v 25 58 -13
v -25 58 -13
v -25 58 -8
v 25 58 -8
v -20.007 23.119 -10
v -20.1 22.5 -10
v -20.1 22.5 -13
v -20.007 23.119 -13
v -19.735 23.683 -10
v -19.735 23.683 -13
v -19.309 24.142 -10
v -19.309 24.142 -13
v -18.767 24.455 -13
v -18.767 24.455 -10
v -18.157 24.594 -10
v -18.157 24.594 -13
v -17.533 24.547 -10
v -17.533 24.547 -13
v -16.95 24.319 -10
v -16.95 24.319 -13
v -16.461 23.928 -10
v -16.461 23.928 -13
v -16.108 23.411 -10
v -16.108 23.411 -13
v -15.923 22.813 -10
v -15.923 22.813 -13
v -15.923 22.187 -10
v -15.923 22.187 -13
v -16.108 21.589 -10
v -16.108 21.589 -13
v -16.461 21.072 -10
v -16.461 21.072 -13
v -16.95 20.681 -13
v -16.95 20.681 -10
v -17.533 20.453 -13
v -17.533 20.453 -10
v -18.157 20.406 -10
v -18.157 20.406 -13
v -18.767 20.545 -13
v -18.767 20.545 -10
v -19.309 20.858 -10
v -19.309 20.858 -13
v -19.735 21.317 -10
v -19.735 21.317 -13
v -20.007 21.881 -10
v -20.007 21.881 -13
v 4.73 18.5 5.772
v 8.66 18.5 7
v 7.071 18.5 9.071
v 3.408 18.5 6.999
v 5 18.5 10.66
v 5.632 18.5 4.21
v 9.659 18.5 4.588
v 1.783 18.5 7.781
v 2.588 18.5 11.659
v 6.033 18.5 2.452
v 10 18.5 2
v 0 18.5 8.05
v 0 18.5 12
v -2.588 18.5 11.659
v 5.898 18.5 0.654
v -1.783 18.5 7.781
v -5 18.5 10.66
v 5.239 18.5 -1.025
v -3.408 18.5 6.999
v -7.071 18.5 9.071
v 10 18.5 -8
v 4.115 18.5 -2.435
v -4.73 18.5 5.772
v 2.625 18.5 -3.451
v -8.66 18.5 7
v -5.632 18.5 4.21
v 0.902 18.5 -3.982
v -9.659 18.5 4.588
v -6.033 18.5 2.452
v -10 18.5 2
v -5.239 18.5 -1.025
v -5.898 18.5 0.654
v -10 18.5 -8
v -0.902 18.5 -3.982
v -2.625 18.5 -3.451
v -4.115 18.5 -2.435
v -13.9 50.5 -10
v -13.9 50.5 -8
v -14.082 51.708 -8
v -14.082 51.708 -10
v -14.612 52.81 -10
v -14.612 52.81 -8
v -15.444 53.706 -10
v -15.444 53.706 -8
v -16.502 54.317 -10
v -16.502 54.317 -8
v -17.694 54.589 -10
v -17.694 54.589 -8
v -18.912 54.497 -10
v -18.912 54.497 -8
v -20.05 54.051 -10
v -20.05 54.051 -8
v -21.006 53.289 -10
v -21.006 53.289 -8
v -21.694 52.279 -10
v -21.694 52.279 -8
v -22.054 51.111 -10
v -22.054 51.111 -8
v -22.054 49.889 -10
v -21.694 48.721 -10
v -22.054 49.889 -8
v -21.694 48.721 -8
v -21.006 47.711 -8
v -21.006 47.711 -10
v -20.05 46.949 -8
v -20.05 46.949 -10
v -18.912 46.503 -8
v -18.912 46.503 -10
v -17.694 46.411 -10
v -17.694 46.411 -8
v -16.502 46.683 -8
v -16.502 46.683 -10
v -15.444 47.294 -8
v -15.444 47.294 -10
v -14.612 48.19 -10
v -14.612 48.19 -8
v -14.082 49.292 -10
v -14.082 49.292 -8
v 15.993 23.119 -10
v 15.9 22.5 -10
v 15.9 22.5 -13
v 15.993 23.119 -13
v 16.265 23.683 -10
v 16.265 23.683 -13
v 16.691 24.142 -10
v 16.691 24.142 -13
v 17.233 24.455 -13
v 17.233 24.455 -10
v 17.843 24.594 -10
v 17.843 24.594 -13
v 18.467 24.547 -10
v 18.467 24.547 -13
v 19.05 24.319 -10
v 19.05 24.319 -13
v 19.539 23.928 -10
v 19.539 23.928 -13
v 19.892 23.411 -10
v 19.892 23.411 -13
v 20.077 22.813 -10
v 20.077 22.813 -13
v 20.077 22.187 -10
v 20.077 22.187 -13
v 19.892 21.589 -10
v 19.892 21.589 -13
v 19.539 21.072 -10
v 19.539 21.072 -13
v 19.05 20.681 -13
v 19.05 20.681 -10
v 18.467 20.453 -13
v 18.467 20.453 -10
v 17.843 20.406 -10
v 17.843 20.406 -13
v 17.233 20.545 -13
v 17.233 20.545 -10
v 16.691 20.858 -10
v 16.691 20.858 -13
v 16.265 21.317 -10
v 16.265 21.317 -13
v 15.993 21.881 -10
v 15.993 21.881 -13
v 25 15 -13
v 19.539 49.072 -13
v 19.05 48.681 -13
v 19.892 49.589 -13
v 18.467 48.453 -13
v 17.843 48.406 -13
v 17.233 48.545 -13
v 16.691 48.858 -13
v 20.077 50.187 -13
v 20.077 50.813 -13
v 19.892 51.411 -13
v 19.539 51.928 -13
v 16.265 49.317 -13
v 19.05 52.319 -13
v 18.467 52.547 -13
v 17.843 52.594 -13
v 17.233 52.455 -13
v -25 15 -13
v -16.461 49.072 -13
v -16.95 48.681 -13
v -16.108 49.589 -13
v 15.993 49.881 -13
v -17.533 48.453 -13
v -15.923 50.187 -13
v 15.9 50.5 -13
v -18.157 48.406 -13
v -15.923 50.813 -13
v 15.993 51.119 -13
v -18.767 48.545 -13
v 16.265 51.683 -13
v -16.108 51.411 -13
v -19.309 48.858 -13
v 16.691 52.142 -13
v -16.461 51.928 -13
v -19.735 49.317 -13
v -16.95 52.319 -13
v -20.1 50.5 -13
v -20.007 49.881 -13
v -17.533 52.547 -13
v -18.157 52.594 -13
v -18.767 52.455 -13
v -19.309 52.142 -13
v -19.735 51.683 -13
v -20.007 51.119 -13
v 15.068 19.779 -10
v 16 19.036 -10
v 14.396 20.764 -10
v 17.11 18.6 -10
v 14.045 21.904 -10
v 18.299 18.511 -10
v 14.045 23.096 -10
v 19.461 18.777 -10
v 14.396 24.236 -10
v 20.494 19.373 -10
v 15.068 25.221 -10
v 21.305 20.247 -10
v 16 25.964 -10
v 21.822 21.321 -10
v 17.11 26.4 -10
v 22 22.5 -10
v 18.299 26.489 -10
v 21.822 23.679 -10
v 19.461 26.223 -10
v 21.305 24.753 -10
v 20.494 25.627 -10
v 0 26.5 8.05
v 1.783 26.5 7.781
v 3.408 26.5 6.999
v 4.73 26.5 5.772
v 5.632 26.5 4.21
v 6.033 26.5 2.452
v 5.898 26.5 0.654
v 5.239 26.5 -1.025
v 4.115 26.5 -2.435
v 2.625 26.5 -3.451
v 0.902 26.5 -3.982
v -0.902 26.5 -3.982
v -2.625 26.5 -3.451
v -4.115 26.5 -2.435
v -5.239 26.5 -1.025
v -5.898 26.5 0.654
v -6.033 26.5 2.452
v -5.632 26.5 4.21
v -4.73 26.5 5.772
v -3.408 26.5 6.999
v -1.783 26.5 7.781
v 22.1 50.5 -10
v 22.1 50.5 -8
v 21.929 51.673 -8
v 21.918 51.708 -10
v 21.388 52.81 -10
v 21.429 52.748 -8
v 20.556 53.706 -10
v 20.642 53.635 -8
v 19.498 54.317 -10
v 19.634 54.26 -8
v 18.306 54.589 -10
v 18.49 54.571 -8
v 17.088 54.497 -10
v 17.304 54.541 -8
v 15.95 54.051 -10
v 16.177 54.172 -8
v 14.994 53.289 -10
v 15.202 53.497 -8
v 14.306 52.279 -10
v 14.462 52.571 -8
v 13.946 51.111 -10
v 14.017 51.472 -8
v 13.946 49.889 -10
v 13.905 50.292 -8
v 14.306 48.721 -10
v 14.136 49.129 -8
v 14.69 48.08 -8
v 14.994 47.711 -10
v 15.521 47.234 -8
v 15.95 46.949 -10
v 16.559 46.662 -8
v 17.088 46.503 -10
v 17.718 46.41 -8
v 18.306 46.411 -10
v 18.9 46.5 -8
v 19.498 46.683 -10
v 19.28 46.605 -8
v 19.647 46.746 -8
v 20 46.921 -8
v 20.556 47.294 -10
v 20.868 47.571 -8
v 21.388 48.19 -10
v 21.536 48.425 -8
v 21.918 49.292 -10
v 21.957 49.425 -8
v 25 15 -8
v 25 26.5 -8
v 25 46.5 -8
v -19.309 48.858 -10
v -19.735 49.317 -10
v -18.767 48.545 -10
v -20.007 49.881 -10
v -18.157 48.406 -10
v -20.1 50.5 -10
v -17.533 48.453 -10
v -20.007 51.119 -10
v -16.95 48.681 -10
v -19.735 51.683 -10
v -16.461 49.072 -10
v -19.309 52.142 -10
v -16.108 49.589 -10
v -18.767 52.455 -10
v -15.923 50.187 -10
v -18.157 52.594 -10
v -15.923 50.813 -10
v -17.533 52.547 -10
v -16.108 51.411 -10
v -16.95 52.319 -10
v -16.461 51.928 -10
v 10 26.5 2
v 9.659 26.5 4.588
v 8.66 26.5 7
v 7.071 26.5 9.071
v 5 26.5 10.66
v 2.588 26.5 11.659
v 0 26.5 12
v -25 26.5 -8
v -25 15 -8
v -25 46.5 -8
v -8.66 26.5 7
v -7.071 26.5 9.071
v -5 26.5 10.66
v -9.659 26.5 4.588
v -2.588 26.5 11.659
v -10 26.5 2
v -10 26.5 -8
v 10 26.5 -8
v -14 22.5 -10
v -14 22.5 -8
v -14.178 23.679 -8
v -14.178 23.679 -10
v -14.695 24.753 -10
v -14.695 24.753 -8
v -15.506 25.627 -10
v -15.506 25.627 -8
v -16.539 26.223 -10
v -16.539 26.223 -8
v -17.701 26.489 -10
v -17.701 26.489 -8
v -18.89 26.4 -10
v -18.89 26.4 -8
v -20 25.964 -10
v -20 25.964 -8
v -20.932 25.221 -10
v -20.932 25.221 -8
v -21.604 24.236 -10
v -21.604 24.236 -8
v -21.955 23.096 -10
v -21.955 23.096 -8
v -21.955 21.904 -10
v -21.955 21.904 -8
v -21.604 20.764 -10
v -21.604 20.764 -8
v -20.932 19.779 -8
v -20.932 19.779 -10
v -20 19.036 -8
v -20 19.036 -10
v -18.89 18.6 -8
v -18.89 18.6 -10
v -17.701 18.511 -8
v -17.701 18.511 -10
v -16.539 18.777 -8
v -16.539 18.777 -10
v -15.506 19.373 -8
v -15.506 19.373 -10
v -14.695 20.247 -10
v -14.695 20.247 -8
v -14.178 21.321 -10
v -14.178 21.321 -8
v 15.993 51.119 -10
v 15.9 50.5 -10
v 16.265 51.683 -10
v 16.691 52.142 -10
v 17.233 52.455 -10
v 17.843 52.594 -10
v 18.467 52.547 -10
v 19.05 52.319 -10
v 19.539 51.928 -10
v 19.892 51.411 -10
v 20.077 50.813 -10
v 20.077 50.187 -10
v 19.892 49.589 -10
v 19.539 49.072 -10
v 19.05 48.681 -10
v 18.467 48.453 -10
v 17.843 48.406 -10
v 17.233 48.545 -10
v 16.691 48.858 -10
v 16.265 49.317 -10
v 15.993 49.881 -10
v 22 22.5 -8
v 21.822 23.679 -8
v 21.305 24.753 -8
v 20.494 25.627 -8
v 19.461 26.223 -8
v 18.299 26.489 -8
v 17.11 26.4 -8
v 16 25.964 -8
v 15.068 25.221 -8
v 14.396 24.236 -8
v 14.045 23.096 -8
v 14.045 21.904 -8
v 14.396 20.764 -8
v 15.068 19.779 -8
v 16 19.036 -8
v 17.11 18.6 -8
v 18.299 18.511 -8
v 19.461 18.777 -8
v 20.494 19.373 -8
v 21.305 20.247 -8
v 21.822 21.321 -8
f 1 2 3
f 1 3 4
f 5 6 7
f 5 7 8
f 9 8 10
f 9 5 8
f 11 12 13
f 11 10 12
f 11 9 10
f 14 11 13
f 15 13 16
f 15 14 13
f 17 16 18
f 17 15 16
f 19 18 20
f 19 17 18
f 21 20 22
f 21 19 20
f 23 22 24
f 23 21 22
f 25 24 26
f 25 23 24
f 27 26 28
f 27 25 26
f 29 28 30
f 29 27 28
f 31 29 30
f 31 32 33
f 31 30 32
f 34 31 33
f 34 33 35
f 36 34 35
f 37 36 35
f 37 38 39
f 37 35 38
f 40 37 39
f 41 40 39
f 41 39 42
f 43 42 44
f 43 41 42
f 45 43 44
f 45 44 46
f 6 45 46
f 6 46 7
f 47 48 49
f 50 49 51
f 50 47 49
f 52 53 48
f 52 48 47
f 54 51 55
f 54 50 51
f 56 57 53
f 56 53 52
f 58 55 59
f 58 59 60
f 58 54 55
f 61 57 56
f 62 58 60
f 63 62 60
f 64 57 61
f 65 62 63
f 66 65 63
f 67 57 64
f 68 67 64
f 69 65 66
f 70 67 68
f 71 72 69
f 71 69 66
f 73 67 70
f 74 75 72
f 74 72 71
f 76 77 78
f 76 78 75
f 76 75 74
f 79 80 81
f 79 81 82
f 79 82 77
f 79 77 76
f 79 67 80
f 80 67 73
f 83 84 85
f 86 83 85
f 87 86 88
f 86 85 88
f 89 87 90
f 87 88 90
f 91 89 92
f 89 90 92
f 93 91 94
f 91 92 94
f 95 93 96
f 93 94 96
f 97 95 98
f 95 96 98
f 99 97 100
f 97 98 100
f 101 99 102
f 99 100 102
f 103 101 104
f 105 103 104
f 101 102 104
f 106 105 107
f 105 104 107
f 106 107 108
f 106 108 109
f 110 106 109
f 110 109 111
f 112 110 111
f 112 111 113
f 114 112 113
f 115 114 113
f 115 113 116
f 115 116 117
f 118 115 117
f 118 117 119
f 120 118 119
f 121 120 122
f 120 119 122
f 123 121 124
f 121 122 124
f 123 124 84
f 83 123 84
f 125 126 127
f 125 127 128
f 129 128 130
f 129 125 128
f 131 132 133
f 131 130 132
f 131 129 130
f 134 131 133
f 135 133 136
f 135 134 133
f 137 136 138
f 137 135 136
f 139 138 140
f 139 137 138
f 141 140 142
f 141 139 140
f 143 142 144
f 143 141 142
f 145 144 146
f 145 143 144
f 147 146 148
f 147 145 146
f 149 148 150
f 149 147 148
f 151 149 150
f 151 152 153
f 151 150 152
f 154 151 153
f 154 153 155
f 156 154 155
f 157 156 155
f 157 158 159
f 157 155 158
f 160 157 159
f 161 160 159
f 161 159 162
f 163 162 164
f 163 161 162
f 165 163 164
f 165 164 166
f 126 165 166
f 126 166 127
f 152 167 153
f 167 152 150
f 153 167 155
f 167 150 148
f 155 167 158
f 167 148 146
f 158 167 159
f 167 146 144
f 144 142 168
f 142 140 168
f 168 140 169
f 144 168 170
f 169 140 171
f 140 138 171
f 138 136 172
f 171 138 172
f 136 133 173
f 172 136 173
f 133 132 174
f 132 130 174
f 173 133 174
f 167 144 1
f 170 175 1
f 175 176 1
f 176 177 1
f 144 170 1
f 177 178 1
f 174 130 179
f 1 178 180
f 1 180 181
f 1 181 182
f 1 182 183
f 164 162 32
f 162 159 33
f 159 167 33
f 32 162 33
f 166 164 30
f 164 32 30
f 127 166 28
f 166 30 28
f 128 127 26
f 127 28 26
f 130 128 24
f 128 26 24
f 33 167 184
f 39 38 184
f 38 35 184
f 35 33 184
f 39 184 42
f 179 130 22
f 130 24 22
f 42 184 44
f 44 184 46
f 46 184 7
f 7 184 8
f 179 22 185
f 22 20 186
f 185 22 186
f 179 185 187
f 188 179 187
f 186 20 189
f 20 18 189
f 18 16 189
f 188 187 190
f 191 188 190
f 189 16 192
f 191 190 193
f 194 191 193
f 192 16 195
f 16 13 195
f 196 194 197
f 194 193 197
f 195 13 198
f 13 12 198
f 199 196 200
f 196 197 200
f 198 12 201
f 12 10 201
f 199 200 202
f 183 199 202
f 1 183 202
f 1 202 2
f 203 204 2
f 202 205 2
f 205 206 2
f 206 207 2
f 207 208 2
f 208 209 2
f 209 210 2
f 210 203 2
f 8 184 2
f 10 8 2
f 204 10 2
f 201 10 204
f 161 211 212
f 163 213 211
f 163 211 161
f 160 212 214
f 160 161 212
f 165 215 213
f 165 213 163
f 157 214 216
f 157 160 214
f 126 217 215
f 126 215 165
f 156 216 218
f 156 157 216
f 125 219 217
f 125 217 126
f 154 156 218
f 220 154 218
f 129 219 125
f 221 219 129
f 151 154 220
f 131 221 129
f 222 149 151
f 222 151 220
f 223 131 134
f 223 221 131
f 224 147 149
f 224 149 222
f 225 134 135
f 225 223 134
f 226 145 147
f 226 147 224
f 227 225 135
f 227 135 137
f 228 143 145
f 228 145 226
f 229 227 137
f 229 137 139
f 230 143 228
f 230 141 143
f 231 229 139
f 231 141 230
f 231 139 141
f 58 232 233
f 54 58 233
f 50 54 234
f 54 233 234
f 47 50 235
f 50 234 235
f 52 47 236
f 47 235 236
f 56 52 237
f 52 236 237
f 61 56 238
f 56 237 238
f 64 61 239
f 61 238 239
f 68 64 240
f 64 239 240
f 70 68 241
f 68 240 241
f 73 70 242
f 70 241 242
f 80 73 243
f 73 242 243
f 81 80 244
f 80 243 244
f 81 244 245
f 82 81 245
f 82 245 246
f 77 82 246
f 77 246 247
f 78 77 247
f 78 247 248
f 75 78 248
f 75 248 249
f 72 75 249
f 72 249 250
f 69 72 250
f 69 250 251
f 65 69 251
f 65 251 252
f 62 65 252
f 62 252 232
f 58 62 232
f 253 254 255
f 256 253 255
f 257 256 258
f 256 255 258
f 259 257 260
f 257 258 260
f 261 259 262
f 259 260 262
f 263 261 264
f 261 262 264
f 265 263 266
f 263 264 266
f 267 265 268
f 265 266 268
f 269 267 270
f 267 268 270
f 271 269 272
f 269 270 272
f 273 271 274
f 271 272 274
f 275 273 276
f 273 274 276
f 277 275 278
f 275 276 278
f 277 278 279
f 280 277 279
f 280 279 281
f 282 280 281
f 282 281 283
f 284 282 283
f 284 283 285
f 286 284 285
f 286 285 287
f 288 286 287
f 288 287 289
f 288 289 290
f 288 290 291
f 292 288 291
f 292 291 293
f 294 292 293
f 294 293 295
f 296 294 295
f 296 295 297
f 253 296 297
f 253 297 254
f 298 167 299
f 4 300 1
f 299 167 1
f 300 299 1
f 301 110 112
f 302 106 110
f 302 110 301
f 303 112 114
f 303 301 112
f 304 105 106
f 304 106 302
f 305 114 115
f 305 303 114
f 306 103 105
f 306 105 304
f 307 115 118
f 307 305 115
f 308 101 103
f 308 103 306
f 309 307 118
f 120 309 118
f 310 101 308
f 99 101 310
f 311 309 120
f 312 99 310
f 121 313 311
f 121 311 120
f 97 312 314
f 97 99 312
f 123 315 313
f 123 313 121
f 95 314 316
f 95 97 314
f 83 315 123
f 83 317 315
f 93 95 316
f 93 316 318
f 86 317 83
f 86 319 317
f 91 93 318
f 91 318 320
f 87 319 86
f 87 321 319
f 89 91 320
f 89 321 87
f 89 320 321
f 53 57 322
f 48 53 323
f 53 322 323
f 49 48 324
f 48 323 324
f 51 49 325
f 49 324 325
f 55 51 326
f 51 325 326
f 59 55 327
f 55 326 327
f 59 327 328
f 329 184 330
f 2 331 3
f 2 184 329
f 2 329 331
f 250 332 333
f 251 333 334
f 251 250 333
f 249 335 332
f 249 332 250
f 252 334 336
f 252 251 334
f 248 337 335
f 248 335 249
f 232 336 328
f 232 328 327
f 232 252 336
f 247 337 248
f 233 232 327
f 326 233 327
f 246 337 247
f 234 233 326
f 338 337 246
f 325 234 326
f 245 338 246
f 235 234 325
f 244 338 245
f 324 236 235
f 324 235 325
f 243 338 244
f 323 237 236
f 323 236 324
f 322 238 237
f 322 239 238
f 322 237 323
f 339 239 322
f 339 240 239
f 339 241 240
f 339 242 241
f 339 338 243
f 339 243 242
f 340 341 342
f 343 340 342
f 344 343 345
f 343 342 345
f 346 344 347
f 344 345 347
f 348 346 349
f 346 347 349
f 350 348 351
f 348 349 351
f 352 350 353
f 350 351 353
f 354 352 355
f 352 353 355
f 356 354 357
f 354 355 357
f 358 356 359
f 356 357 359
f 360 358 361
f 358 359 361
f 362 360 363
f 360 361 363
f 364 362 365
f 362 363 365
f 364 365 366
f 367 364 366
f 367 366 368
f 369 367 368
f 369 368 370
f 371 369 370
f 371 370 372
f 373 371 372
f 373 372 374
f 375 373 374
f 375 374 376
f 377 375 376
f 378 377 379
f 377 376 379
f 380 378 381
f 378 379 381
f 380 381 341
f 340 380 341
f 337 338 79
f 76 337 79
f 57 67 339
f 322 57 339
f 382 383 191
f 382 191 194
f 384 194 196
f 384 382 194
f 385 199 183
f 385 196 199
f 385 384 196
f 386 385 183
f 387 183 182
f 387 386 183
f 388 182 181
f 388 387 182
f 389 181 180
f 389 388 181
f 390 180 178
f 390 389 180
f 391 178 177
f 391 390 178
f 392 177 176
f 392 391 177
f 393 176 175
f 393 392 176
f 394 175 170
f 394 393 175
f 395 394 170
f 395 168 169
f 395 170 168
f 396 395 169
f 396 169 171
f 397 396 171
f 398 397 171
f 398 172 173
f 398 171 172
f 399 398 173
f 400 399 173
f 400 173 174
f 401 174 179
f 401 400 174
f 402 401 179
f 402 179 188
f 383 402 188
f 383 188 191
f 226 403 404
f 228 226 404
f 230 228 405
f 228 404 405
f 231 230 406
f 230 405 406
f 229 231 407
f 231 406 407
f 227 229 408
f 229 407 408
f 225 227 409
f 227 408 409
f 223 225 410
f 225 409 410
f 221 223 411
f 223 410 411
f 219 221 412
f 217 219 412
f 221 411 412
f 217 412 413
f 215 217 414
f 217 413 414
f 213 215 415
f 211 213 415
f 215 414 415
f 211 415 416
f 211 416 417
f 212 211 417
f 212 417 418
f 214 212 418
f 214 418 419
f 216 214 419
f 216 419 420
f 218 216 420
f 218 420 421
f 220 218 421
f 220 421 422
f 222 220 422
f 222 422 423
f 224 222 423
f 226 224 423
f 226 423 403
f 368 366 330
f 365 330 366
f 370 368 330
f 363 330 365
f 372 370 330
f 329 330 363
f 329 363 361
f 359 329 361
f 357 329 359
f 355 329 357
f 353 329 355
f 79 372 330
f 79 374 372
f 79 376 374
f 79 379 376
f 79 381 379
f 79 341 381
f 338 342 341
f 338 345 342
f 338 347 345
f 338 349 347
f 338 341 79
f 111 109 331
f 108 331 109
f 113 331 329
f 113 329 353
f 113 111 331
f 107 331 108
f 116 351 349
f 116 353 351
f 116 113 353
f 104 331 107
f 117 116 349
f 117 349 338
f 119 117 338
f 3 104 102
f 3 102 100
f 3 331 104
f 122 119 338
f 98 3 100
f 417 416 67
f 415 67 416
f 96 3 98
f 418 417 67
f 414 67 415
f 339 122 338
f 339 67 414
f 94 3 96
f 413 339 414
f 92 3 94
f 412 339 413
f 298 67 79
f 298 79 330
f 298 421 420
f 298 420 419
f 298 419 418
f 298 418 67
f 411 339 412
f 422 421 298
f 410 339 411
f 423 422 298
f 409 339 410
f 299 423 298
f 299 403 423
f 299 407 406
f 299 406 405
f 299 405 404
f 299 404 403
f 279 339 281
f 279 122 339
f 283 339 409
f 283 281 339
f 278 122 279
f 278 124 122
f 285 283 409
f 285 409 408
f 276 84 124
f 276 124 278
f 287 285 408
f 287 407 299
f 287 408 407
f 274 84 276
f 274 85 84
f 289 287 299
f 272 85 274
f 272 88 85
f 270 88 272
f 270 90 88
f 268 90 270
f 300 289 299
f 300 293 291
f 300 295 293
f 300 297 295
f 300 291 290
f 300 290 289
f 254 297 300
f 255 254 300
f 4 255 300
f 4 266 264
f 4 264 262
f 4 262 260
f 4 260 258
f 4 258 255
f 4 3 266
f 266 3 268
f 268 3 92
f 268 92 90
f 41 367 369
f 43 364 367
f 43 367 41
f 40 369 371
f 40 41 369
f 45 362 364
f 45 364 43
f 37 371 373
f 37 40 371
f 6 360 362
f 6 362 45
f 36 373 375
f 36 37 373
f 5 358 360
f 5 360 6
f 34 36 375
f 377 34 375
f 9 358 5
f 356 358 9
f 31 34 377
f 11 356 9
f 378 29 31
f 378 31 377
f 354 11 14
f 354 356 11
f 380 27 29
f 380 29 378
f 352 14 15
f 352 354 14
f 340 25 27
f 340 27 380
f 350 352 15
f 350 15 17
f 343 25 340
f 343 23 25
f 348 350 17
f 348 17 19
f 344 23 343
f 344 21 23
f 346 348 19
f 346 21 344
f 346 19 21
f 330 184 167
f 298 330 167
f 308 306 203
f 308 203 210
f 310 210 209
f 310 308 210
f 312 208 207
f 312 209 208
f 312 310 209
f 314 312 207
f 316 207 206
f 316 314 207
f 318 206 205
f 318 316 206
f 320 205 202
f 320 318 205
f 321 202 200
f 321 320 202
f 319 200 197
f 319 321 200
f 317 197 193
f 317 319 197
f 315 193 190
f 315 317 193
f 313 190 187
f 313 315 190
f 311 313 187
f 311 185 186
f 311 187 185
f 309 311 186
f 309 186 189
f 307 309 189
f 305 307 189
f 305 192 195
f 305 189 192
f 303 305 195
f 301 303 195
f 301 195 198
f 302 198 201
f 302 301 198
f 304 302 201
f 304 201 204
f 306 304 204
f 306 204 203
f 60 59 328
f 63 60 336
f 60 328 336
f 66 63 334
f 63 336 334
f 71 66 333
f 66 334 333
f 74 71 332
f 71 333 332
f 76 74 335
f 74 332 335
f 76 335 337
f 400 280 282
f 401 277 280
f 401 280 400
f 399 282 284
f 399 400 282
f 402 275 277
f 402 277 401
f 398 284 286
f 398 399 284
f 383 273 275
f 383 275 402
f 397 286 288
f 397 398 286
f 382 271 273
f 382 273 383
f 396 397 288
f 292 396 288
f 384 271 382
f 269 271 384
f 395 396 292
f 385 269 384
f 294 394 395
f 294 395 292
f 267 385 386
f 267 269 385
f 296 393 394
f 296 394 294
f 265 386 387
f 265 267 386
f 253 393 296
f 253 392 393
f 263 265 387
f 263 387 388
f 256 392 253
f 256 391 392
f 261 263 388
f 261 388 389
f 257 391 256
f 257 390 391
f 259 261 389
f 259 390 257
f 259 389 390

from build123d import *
from build123d.topology import SkipClean

# Parameters (mm, degrees)
SKETCH_1_R           = 2
EXTRUDE_1_DEPTH      = 5
EXTRUDE_5_DEPTH      = 18
SKETCH_6_W           = 40
SKETCH_6_H           = 5
EXTRUDE_6_DEPTH      = 25
SKETCH_7_W           = 40
SKETCH_7_H           = 5
EXTRUDE_7_DEPTH      = 27
SKETCH_9_R           = 10
CUT_EXTRUDE_4_DEPTH  = 50
SKETCH_10_W          = 8
SKETCH_10_H          = 5
EXTRUDE_9_DEPTH      = 20
CUT_EXTRUDE_8_DEPTH  = 20
CUT_EXTRUDE_9_DEPTH  = 20
SKETCH_16_W          = 40
SKETCH_16_H          = 4
EXTRUDE_10_DEPTH     = 5
SKETCH_17_W          = 40
SKETCH_17_H          = 4
EXTRUDE_12_DEPTH     = 12
SKETCH_18_R          = 1.5
CUT_EXTRUDE_10_DEPTH = 10
CUT_EXTRUDE_11_DEPTH = 10
SKETCH_22_W          = 39.912411086
SKETCH_22_H          = 12
CUT_EXTRUDE_12_DEPTH = 10
SKETCH_23_W          = 1.771441315
SKETCH_23_H          = 1.605869394
CUT_EXTRUDE_13_DEPTH = 10
SKETCH_24_W          = 40
SKETCH_24_H          = 4
EXTRUDE_13_DEPTH     = 7
SKETCH_26_R          = 1.5
CUT_EXTRUDE_14_DEPTH = 7
SKETCH_27_W          = 8
SKETCH_27_H          = 26.5
EXTRUDE_14_DEPTH     = 5
SKETCH_28_W          = 8
SKETCH_28_H          = 25
EXTRUDE_15_DEPTH     = 5
SKETCH_30_W          = 8
SKETCH_30_H          = 1.5
CUT_EXTRUDE_15_DEPTH = 5
SKETCH_31_R          = 2.52
CUT_EXTRUDE_16_DEPTH = 5
SKETCH_32_R          = 2.52
CUT_EXTRUDE_17_DEPTH = 5
CUT_EXTRUDE_18_DEPTH = 5
SKETCH_2_R           = 4
CUT_EXTRUDE_19_DEPTH = 3
SKETCH_35_W          = 4
SKETCH_35_H          = 12
CUT_EXTRUDE_20_DEPTH = 100
SKETCH_37_W          = 50
SKETCH_37_H          = 43
CUT_EXTRUDE_21_DEPTH = 100
SKETCH_38_W          = 50
SKETCH_38_H          = 43
SKETCH_38_R          = 10
EXTRUDE_20_DEPTH     = 5
SKETCH_39_W          = 50
SKETCH_39_H          = 43
SKETCH_39_W_2        = 40
SKETCH_39_H_2        = 30
EXTRUDE_21_DEPTH     = 5
CUT_EXTRUDE_START    = -100
SKETCH_41_R          = 2.1
SKETCH_41_R_2        = 10
CUT_EXTRUDE_23_DEPTH = 100
SKETCH_42_W          = 6
SKETCH_42_H          = 5
CUT_EXTRUDE_24_DEPTH = 13
SKETCH_43_R          = 4.1
CUT_EXTRUDE_27_DEPTH = 29
EXTRUDE_START        = 27
EXTRUDE_22_DEPTH     = 27
EXTRUDE_23_DEPTH     = 27
SKETCH_46_W          = 28
SKETCH_46_H          = 0.25
EXTRUDE_24_DEPTH     = 20
SKETCH_47_R          = 4
CUT_EXTRUDE_28_DEPTH = 2
CUT_EXTRUDE_29_DEPTH = 10
CUT_EXTRUDE_30_DEPTH = 10
SKETCH_50_W          = 27
SKETCH_50_H          = 11.6
SKETCH_50_H_2        = 10.600731696
SKETCH_50_W_2        = 5
SKETCH_50_H_3        = 9.36628082
CUT_EXTRUDE_31_DEPTH = 60
SKETCH_51_R          = 10
SKETCH_51_W          = 5.257466337
SKETCH_51_H          = 20
SKETCH_51_W_2        = 5.257304599
EXTRUDE_25_DEPTH     = 10
SKETCH_52_W          = 5
SKETCH_52_H          = 43
CUT_EXTRUDE_32_DEPTH = 50
EXTRUDE_26_DEPTH     = 20
SKETCH_57_R          = 6.05
CUT_EXTRUDE_33_DEPTH = 20


with BuildPart() as part:
    # 草图1 → 凸台-拉伸1 (new body)
    with BuildSketch(Plane.XY):
        Polygon((0, 21.5), (25, 21.5), (25, -21.5), (-25, -21.5), (-25, 21.5), align=None)
        with Locations((-18, 14)):
            Circle(SKETCH_1_R, mode=Mode.SUBTRACT)
        with Locations((-18, -14)):
            Circle(SKETCH_1_R, mode=Mode.SUBTRACT)
        with Locations((18, -14)):
            Circle(SKETCH_1_R, mode=Mode.SUBTRACT)
        with Locations((18, 14)):
            Circle(SKETCH_1_R, mode=Mode.SUBTRACT)
    extrude(amount=EXTRUDE_1_DEPTH)

    # 草图5 → 凸台-拉伸5 (add)
    with BuildSketch(Plane.XY.offset(5)):
        Polygon((0, 26.5), (20, 26.5), (20, 21.5), (-20, 21.5), (-20, 26.5), align=None)
    extrude(amount=-EXTRUDE_5_DEPTH)

    # 草图6 → 凸台-拉伸6 (add)
    with BuildSketch(Plane(origin=(0, 26.5, 0), x_dir=(1, 0, 0), z_dir=(0, 1, 0))):
        with Locations((0, 10.5)):
            Rectangle(SKETCH_6_W, SKETCH_6_H)
    extrude(amount=EXTRUDE_6_DEPTH)

    # 草图7 → 凸台-拉伸7 (add)
    with BuildSketch(Plane.XY.offset(-8)):
        with Locations((0, 49)):
            Rectangle(SKETCH_7_W, SKETCH_7_H)
    extrude(amount=EXTRUDE_7_DEPTH)

    # 草图9 → 切除-拉伸4 (cut)
    with BuildSketch(Plane(origin=(0, 0, 0), x_dir=(-1, 0, 0), z_dir=(0, 0, -1))):
        Circle(SKETCH_9_R)
    extrude(amount=-CUT_EXTRUDE_4_DEPTH, mode=Mode.SUBTRACT)

    # 草图10 → 凸台-拉伸9 (add)
    with BuildSketch(Plane(origin=(0, 51.5, 0), x_dir=(1, 0, 0), z_dir=(0, 1, 0))):
        with Locations((-24, -16.5)):
            Rectangle(SKETCH_10_W, SKETCH_10_H)
        with Locations((24, -16.5)):
            Rectangle(SKETCH_10_W, SKETCH_10_H)
    extrude(amount=-EXTRUDE_9_DEPTH)

    # 草图12 → 切除-拉伸8 (cut)
    with BuildSketch(Plane(origin=(0, 0, 14), x_dir=(-1, 0, 0), z_dir=(0, 0, -1))):
        with BuildLine():
            Line((28, 46), (28, 47))
            Line((28, 47), (27.949489743, 47))
            ThreePointArc((27.949489743, 47), (23, 46.5), (27.949489743, 46))
            Line((27.949489743, 46), (28, 46))
        make_face()
        with BuildLine():
            Line((27.949489743, 36), (28, 36))
            Line((28, 36), (28, 37))
            Line((28, 37), (27.949489743, 37))
            ThreePointArc((27.949489743, 37), (23, 36.5), (27.949489743, 36))
        make_face()
    extrude(amount=-CUT_EXTRUDE_8_DEPTH, mode=Mode.SUBTRACT)

    # 草图15 → 切除-拉伸9 (cut)
    with BuildSketch(Plane(origin=(0, 0, 14), x_dir=(-1, 0, 0), z_dir=(0, 0, -1))):
        with BuildLine():
            ThreePointArc((-27.949489743, 46), (-23, 46.5), (-27.949489743, 47))
            Line((-27.949489743, 47), (-28, 47))
            Line((-28, 47), (-28, 46))
            Line((-28, 46), (-27.949489743, 46))
        make_face()
        with BuildLine():
            Line((-27.949489743, 37), (-28, 37))
            Line((-28, 37), (-28, 36))
            Line((-28, 36), (-27.949489743, 36))
            ThreePointArc((-27.949489743, 36), (-23, 36.5), (-27.949489743, 37))
        make_face()
    extrude(amount=-CUT_EXTRUDE_9_DEPTH, mode=Mode.SUBTRACT)

    # 草图16 → 凸台-拉伸10 (add)
    with BuildSketch(Plane(origin=(0, 51.5, 0), x_dir=(1, 0, 0), z_dir=(0, 1, 0))):
        with Locations((0, -21)):
            Rectangle(SKETCH_16_W, SKETCH_16_H)
    extrude(amount=-EXTRUDE_10_DEPTH)

    # 草图17 → 凸台-拉伸12 (add)
    with BuildSketch(Plane(origin=(0, 51.5, 0), x_dir=(1, 0, 0), z_dir=(0, 1, 0))):
        with Locations((0, -21)):
            Rectangle(SKETCH_17_W, SKETCH_17_H)
    extrude(amount=EXTRUDE_12_DEPTH)

    # 草图18 → 切除-拉伸10 (cut)
    with BuildSketch(Plane(origin=(0, 0, 19), x_dir=(-1, 0, 0), z_dir=(0, 0, -1))):
        with Locations((6, 59.5)):
            Circle(SKETCH_18_R)
        with Locations((13, 59.5)):
            Circle(SKETCH_18_R)
    extrude(amount=-CUT_EXTRUDE_10_DEPTH, mode=Mode.SUBTRACT)

    # 草图20 → 切除-拉伸11 (cut)
    with BuildSketch(Plane.XY.offset(23)):
        with BuildLine():
            ThreePointArc((8, 63.5), (16.485281374, 59.985281374), (20, 51.5))
            Line((20, 51.5), (20, 63.5))
            Line((20, 63.5), (8, 63.5))
        make_face()
    extrude(amount=-CUT_EXTRUDE_11_DEPTH, mode=Mode.SUBTRACT)

    # 草图22 → 切除-拉伸12 (cut)
    with BuildSketch(Plane.XY.offset(23)):
        with Locations((-0.043794457, 57.5)):
            Rectangle(SKETCH_22_W, SKETCH_22_H)
    extrude(amount=-CUT_EXTRUDE_12_DEPTH, mode=Mode.SUBTRACT)

    # 草图23 → 切除-拉伸13 (cut)
    with BuildSketch(Plane.XY.offset(23)):
        with Locations((20.269466875, 52.302934697)):
            Rectangle(SKETCH_23_W, SKETCH_23_H)
    extrude(amount=-CUT_EXTRUDE_13_DEPTH, mode=Mode.SUBTRACT)

    # 草图24 → 凸台-拉伸13 (add)
    with BuildSketch(Plane(origin=(0, 51.5, 0), x_dir=(1, 0, 0), z_dir=(0, 1, 0))):
        with Locations((0, -21)):
            Rectangle(SKETCH_24_W, SKETCH_24_H)
    extrude(amount=EXTRUDE_13_DEPTH)

    # 草图26 → 切除-拉伸14 (cut)
    with BuildSketch(Plane.XY.offset(23)):
        with Locations((-13, 54.5)):
            Circle(SKETCH_26_R)
        with Locations((-6, 54.5)):
            Circle(SKETCH_26_R)
    extrude(amount=-CUT_EXTRUDE_14_DEPTH, mode=Mode.SUBTRACT)

    # 草图27 → 凸台-拉伸14 (add)
    with BuildSketch(Plane.XY.offset(19)):
        with Locations((24, 38.25)):
            Rectangle(SKETCH_27_W, SKETCH_27_H)
    extrude(amount=-EXTRUDE_14_DEPTH)

    # 草图28 → 凸台-拉伸15 (add)
    with BuildSketch(Plane.XY.offset(19)):
        with Locations((-24, 39)):
            Rectangle(SKETCH_28_W, SKETCH_28_H)
    extrude(amount=-EXTRUDE_15_DEPTH)

    # 草图30 → 切除-拉伸15 (cut)
    with BuildSketch(Plane.XY.offset(19)):
        with Locations((24, 25.75)):
            Rectangle(SKETCH_30_W, SKETCH_30_H)
    extrude(amount=-CUT_EXTRUDE_15_DEPTH, mode=Mode.SUBTRACT)

    # 草图31 → 切除-拉伸16 (cut)
    with BuildSketch(Plane.XY.offset(19)):
        with Locations((25.5, 41.5)):
            Circle(SKETCH_31_R)
        with Locations((25.5, 31.5)):
            Circle(SKETCH_31_R)
    extrude(amount=-CUT_EXTRUDE_16_DEPTH, mode=Mode.SUBTRACT)

    # 草图32 → 切除-拉伸17 (cut)
    with BuildSketch(Plane.XY.offset(19)):
        with Locations((-25.5, 41.5)):
            Circle(SKETCH_32_R)
        with Locations((-25.5, 31.5)):
            Circle(SKETCH_32_R)
    extrude(amount=-CUT_EXTRUDE_17_DEPTH, mode=Mode.SUBTRACT)

    # 草图33 → 切除-拉伸18 (cut)
    with BuildSketch(Plane(origin=(0, 0, 19), x_dir=(-1, 0, 0), z_dir=(0, 0, -1))):
        with BuildLine():
            Line((-20, 58.5), (-20, 51.5))
            ThreePointArc((-20, 51.5), (-17.949747468, 56.449747468), (-13, 58.5))
            Line((-13, 58.5), (-20, 58.5))
        make_face()
        with BuildLine():
            Line((20, 58.5), (13, 58.5))
            ThreePointArc((13, 58.5), (17.949747468, 56.449747468), (20, 51.5))
            Line((20, 51.5), (20, 58.5))
        make_face()
    extrude(amount=-CUT_EXTRUDE_18_DEPTH, mode=Mode.SUBTRACT)

    # 草图2 → 切除-拉伸19 (cut)
    with BuildSketch(Plane.XY.offset(5)):
        with Locations((18, 14)):
            Circle(SKETCH_2_R)
        with Locations((-18, 14)):
            Circle(SKETCH_2_R)
        with Locations((-18, -14)):
            Circle(SKETCH_2_R)
        with Locations((18, -14)):
            Circle(SKETCH_2_R)
    extrude(amount=-CUT_EXTRUDE_19_DEPTH, mode=Mode.SUBTRACT)

    # 草图35 → 切除-拉伸20 (cut)
    with BuildSketch(Plane.ZY.offset(20)):
        with Locations((21, 52.5)):
            Rectangle(SKETCH_35_W, SKETCH_35_H)
    extrude(amount=-CUT_EXTRUDE_20_DEPTH, mode=Mode.SUBTRACT)

    # 草图37 → 切除-拉伸21 (cut)
    with BuildSketch(Plane.XY.offset(5)):
        Rectangle(SKETCH_37_W, SKETCH_37_H)
    extrude(amount=-CUT_EXTRUDE_21_DEPTH, mode=Mode.SUBTRACT)

    # 草图38 → 凸台-拉伸20 (add)
    with BuildSketch(Plane(origin=(0, 0, -13), x_dir=(-1, 0, 0), z_dir=(0, 0, -1))):
        with Locations((0, 36.5)):
            Rectangle(SKETCH_38_W, SKETCH_38_H)
        with Locations((0, 36.5)):
            Circle(SKETCH_38_R, mode=Mode.SUBTRACT)
    extrude(amount=EXTRUDE_20_DEPTH)

    # 草图39 → 凸台-拉伸21 (add)
    with BuildSketch(Plane.XY.offset(-13)):
        with Locations((0, 36.5)):
            Rectangle(SKETCH_39_W, SKETCH_39_H)
        with Locations((0, 36.5)):
            Rectangle(SKETCH_39_W_2, SKETCH_39_H_2, mode=Mode.SUBTRACT)
    extrude(amount=EXTRUDE_21_DEPTH)

    # 草图41 → 切除-拉伸23 (cut)
    with BuildSketch(Plane(origin=(0, 0, -18), x_dir=(-1, 0, 0), z_dir=(0, 0, -1)).offset(CUT_EXTRUDE_START)):
        with Locations((-18, 50.5)):
            Circle(SKETCH_41_R)
        with Locations((18, 50.5)):
            Circle(SKETCH_41_R)
        with Locations((18, 22.5)):
            Circle(SKETCH_41_R)
        with Locations((-18, 22.5)):
            Circle(SKETCH_41_R)
        with Locations(Location((0, 36.5, 0), (0, 0, 270))):
            Circle(SKETCH_41_R_2)
    extrude(amount=CUT_EXTRUDE_23_DEPTH, mode=Mode.SUBTRACT)

    # 草图42 → 切除-拉伸24 (cut)
    with BuildSketch(Plane.XY.offset(5)):
        with Locations((-17, 24)):
            Rectangle(SKETCH_42_W, SKETCH_42_H)
        with Locations((17, 24)):
            Rectangle(SKETCH_42_W, SKETCH_42_H)
    extrude(amount=-CUT_EXTRUDE_24_DEPTH, mode=Mode.SUBTRACT)

    # 草图43 → 切除-拉伸27 (cut)
    with BuildSketch(Plane.XY.offset(19)):
        with Locations((-18, 50.5)):
            Circle(SKETCH_43_R)
        with Locations((18, 50.5)):
            Circle(SKETCH_43_R)
    extrude(amount=-CUT_EXTRUDE_27_DEPTH, mode=Mode.SUBTRACT)

    # 草图44 → 凸台-拉伸22 (add)
    with SkipClean():  # the faces are left unmerged after this step: merging them gives an invalid solid
        with BuildSketch(Plane.XY.offset(-8).offset(EXTRUDE_START)):
            with BuildLine():
                Line((-25, 46.5), (-20, 46.5))
                Line((-20, 46.5), (-20, 46.920893966))
                ThreePointArc((-20, 46.920893966), (-22.1, 50.5), (-20, 54.079106034))
                Line((-20, 54.079106034), (-20, 58))
                Line((-20, 58), (-25, 58))
                Line((-25, 58), (-25, 46.5))
            make_face()
        extrude(amount=-EXTRUDE_22_DEPTH)

    # 草图45 → 凸台-拉伸23 (add)
    with SkipClean():  # the faces are left unmerged after this step: merging them gives an invalid solid
        with BuildSketch(Plane.XY.offset(-8).offset(EXTRUDE_START)):
            with BuildLine():
                Line((18.9, 46.5), (25, 46.5))
                Line((25, 46.5), (25, 58))
                Line((25, 58), (20, 58))
                Line((20, 58), (20, 54.079106034))
                ThreePointArc((20, 54.079106034), (22.057488307, 49.911112372), (18.9, 46.5))
            make_face()
        extrude(amount=-EXTRUDE_23_DEPTH)

    # 草图46 → 凸台-拉伸24 (add)
    with SkipClean():  # the faces are left unmerged after this step: merging them gives an invalid solid
        with BuildSketch(Plane.XY.offset(5)):
            with Locations((0, 26.625)):
                Rectangle(SKETCH_46_W, SKETCH_46_H)
        extrude(amount=-EXTRUDE_24_DEPTH)

    # 草图47 → 切除-拉伸28 (cut)
    with SkipClean():  # the faces are left unmerged after this step: merging them gives an invalid solid
        with BuildSketch(Plane.XY.offset(-8)):
            with Locations((-18, 22.5)):
                Circle(SKETCH_47_R)
            with Locations((18, 22.5)):
                Circle(SKETCH_47_R)
        extrude(amount=-CUT_EXTRUDE_28_DEPTH, mode=Mode.SUBTRACT)

    # 草图48 → 切除-拉伸29 (cut)
    with SkipClean():  # the faces are left unmerged after this step: merging them gives an invalid solid
        with BuildSketch(Plane.XY.offset(-8)):
            with BuildLine():
                Line((-25, 46.5), (-25, 26.5))
                ThreePointArc((-25, 26.5), (-19.999999498, 36.5), (-25, 46.5))
            make_face()
        extrude(amount=-CUT_EXTRUDE_29_DEPTH, mode=Mode.SUBTRACT)

    # 草图49 → 切除-拉伸30 (cut)
    with SkipClean():  # the faces are left unmerged after this step: merging them gives an invalid solid
        with BuildSketch(Plane.XY.offset(-8)):
            with BuildLine():
                Line((25, 46.5), (25, 26.5))
                ThreePointArc((25, 26.5), (20, 36.5), (25, 46.5))
            make_face()
        extrude(amount=-CUT_EXTRUDE_30_DEPTH, mode=Mode.SUBTRACT)

    # 草图50 → 切除-拉伸31 (cut)
    with BuildSketch(Plane.ZY.offset(28)):
        with Locations((5.5, 52.2)):
            Rectangle(SKETCH_50_W, SKETCH_50_H)
        Polygon((-8, 26.5), (19, 26.5), (19, 31.81685959), (14, 31.81685959), (14, 41.18314041), (19, 41.18314041), (19, 46.4), (-8, 46.4), align=None)
        with Locations((5.5, 21.199634152)):
            Rectangle(SKETCH_50_W, SKETCH_50_H_2)
        with Locations((16.5, 36.5)):
            Rectangle(SKETCH_50_W_2, SKETCH_50_H_3)
    extrude(amount=-CUT_EXTRUDE_31_DEPTH, mode=Mode.SUBTRACT)

    # 草图51 → 凸台-拉伸25 (add)
    with BuildSketch(Plane.XY.offset(-8)):
        with Locations((0, 36.5)):
            Circle(SKETCH_51_R)
        with Locations((-22.371266832, 36.5)):
            Rectangle(SKETCH_51_W, SKETCH_51_H)
        with Locations((22.371347701, 36.5)):
            Rectangle(SKETCH_51_W_2, SKETCH_51_H)
    extrude(amount=-EXTRUDE_25_DEPTH)

    # 草图52 → 切除-拉伸32 (cut)
    with BuildSketch(Plane.ZY.offset(25)):
        with Locations((-15.5, 36.5)):
            Rectangle(SKETCH_52_W, SKETCH_52_H)
    extrude(amount=-CUT_EXTRUDE_32_DEPTH, mode=Mode.SUBTRACT)

    # 草图53 → 凸台-拉伸26 (add)
    with BuildSketch(Plane.XY.offset(-8)):
        Polygon((-10, 22.5), (-10, 26.5), (10, 26.5), (10, 22.5), (10, 18.5), (-10, 18.5), align=None)
    extrude(amount=EXTRUDE_26_DEPTH)

    # 草图57 → 切除-拉伸33 (cut)
    with BuildSketch(Plane(origin=(0, 26.5, 0), x_dir=(1, 0, 0), z_dir=(0, 1, 0))):
        with Locations(Location((0, -2, 0), (0, 0, 270))):
            Circle(SKETCH_57_R)
        with BuildLine():
            ThreePointArc((0, -12), (-7.071067812, -9.071067812), (-10, -2))
            Line((-10, -2), (-10, -12))
            Line((-10, -12), (0, -12))
        make_face()
        with BuildLine():
            ThreePointArc((10, -2), (7.071067812, -9.071067812), (0, -12))
            Line((0, -12), (10, -12))
            Line((10, -12), (10, -2))
        make_face()
    extrude(amount=-CUT_EXTRUDE_33_DEPTH, mode=Mode.SUBTRACT)


solid = part.part
